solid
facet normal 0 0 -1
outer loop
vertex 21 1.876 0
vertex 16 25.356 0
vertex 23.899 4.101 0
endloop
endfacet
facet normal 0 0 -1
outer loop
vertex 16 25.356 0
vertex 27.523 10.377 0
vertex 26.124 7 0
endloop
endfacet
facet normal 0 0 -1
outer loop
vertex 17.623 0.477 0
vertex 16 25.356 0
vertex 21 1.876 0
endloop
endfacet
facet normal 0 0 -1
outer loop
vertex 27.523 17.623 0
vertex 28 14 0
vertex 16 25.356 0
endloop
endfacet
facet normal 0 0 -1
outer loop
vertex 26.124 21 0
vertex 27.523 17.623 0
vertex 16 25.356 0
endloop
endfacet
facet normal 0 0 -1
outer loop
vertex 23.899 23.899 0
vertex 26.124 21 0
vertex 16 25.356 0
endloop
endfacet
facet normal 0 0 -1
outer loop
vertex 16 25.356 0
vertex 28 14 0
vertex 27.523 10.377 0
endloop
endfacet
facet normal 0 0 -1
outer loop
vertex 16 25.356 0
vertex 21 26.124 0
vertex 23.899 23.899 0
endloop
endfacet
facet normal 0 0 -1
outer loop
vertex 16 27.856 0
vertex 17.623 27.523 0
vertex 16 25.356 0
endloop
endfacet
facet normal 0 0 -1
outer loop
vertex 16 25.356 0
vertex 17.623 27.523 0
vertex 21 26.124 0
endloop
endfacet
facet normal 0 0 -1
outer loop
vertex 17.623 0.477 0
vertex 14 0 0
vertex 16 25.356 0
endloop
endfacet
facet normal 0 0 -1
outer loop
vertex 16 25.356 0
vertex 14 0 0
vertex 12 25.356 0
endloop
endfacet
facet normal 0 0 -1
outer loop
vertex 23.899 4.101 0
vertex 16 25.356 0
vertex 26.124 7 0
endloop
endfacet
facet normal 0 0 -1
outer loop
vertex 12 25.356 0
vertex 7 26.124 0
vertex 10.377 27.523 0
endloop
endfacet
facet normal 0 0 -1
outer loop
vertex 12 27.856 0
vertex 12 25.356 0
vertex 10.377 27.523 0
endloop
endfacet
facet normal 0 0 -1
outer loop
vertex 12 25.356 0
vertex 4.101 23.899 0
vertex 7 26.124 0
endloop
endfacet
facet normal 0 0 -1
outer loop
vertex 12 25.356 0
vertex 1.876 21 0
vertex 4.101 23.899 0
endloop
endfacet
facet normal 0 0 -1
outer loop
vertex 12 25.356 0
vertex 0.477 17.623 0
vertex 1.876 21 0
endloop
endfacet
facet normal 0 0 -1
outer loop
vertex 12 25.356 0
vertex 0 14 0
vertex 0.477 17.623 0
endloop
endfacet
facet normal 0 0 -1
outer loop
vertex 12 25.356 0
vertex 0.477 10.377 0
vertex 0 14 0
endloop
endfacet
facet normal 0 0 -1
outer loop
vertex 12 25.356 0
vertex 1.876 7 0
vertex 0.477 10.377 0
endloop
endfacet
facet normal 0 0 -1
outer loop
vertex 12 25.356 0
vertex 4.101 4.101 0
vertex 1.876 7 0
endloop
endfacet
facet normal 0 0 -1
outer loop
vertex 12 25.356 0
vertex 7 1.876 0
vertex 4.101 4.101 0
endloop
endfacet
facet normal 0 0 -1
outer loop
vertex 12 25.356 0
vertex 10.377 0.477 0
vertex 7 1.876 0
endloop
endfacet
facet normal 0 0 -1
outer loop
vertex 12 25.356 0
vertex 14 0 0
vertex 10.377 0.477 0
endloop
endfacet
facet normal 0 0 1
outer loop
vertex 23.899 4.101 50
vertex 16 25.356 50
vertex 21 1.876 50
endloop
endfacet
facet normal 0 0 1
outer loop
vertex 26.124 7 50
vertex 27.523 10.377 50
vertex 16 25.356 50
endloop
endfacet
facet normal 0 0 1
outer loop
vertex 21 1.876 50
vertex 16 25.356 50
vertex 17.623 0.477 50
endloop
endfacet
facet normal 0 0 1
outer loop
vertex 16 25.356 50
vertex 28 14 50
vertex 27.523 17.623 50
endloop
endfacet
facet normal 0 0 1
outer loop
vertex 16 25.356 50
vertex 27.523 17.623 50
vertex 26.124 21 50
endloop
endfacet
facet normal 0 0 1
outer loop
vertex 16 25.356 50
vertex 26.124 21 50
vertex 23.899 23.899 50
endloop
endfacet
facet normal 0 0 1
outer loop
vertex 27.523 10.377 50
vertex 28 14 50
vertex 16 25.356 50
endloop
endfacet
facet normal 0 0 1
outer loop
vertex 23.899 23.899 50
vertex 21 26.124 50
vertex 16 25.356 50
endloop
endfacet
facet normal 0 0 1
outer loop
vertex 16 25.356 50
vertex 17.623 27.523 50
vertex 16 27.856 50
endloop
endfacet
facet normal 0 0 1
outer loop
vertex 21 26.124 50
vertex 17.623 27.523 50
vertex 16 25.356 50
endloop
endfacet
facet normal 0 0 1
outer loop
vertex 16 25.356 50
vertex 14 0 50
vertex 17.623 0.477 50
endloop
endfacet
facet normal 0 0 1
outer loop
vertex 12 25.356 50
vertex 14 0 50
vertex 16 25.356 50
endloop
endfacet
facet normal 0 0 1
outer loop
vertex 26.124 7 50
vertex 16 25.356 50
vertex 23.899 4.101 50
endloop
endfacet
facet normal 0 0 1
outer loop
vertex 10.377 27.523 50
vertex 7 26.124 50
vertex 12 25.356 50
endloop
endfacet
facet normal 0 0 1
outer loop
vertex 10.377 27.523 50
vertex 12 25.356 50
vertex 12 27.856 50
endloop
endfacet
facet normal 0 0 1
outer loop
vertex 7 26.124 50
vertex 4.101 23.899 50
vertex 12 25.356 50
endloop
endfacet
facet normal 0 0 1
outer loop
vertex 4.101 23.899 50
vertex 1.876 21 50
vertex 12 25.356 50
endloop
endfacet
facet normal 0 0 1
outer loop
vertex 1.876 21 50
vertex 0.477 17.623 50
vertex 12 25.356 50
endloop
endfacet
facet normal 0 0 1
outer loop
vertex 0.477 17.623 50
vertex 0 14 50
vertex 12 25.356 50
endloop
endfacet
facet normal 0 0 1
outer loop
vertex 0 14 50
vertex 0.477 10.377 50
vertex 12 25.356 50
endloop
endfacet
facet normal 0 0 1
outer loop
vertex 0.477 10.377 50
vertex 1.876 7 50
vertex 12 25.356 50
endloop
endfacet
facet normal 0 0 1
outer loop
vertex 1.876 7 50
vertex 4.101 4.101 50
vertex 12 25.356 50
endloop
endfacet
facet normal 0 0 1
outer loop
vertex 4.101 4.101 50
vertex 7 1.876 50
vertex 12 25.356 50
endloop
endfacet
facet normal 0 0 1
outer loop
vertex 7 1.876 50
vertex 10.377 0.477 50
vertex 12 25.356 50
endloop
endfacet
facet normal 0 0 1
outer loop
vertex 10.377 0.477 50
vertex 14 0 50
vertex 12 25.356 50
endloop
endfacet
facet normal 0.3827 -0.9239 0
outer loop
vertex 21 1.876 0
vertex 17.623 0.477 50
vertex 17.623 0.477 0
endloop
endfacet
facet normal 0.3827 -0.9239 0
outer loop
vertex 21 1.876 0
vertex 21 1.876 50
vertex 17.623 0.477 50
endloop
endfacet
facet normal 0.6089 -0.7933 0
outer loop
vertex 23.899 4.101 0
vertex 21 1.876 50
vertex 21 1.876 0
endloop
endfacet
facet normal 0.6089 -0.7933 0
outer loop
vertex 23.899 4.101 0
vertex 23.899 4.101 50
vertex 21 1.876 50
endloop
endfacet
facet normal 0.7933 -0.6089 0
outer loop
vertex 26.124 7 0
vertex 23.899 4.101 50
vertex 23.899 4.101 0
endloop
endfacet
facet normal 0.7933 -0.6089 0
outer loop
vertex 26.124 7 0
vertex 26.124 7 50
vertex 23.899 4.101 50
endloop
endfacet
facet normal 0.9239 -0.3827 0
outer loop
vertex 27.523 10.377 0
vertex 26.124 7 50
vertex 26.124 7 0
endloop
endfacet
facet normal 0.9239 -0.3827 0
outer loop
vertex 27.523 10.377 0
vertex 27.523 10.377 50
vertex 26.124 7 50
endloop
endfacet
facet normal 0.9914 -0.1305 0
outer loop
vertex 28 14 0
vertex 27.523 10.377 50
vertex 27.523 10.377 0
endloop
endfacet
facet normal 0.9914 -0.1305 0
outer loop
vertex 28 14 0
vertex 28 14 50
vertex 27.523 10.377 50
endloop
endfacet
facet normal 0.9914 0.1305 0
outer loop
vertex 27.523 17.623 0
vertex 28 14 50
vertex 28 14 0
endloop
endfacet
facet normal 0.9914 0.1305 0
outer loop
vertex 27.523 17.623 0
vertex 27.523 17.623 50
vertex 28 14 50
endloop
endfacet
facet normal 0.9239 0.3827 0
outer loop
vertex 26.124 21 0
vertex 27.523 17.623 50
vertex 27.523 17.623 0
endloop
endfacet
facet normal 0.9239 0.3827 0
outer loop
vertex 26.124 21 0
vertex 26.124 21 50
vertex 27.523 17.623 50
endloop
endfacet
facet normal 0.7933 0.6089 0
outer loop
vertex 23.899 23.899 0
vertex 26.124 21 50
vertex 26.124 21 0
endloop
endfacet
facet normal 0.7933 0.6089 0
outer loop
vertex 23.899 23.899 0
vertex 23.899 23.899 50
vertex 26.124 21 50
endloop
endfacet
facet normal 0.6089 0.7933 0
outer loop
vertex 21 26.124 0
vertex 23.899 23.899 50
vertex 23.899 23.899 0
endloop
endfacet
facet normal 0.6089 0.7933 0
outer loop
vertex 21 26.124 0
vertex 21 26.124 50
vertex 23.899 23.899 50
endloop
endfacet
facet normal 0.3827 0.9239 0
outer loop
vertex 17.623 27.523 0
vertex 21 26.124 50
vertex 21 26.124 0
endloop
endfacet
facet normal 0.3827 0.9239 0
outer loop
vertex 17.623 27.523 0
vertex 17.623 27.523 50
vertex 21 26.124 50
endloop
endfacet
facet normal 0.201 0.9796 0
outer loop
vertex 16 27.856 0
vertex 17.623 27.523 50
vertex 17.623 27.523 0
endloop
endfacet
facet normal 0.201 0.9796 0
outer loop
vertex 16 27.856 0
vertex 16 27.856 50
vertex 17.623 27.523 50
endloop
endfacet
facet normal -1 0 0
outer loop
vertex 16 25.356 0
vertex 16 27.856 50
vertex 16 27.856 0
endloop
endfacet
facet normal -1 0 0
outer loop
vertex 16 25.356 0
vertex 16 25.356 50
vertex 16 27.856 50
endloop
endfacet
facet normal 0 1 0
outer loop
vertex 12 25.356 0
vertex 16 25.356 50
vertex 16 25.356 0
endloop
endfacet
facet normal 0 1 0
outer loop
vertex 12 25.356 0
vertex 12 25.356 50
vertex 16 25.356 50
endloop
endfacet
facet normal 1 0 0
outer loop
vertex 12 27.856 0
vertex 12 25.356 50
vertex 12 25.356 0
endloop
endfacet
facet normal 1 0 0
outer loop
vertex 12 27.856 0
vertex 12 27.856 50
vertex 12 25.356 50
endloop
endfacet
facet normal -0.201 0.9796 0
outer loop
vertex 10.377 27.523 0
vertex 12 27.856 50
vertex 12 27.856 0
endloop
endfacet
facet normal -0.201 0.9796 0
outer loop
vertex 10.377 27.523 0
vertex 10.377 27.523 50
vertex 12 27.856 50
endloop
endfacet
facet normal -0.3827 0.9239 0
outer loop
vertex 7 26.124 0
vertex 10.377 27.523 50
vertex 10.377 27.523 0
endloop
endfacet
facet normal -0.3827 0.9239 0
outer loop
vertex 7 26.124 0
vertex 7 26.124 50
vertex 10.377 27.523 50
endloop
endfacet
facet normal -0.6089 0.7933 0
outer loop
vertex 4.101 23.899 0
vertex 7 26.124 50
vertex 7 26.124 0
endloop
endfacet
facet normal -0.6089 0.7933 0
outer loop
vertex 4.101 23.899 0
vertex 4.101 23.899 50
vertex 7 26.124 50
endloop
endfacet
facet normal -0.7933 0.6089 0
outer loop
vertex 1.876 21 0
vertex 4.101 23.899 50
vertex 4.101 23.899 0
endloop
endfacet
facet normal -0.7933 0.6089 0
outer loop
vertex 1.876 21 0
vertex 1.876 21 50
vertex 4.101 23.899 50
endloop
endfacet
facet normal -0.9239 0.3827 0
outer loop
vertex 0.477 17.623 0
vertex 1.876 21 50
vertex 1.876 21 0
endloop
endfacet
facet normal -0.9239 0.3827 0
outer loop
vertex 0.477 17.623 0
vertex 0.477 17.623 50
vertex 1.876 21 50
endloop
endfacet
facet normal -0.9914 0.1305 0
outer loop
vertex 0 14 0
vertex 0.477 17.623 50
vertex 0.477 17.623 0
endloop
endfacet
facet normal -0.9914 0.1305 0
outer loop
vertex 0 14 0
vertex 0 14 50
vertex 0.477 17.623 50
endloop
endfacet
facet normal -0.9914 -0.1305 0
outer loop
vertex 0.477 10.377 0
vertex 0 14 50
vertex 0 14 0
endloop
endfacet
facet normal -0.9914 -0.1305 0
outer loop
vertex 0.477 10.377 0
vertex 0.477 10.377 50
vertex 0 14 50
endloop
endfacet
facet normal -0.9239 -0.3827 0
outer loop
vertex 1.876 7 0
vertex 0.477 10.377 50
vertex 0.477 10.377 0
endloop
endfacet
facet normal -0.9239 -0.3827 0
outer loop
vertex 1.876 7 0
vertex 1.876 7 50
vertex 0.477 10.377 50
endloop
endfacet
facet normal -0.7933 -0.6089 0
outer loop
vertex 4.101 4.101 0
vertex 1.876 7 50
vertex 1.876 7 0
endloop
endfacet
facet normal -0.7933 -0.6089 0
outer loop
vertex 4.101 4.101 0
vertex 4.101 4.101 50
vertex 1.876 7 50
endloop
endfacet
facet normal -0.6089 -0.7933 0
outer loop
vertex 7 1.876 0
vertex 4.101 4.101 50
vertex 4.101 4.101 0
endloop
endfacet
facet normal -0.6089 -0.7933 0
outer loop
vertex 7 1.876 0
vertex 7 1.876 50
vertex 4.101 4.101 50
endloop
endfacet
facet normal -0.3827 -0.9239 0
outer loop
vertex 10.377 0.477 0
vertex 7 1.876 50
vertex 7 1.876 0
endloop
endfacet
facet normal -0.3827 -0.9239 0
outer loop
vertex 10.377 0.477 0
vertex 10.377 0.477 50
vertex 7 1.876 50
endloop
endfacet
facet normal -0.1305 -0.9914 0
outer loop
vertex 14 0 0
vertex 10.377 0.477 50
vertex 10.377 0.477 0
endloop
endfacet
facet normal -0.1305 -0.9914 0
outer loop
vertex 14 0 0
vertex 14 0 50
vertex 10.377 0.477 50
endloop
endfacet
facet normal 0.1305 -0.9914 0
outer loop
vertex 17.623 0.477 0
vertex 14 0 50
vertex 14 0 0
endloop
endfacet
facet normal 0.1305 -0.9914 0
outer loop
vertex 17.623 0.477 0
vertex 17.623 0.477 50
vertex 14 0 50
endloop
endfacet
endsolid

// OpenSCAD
$fn = 32;

// ----------------------------------------------------------------------
// Keyway shaft: d28 shaft, key 4 x 2.5 mm
// ----------------------------------------------------------------------

// --- parameters (mm) ---
shaft_r = 14;             // shaft radius
key_w = 4;                // keyway width
key_d = 2.5;              // keyway depth below the surface line
plate_t = 50;             // shaft length, Z (extrusion height)
fit_tol = 0.1;            // declared fit tolerance (prompt contract)
free_tol = 0.5;           // declared free tolerance (prompt contract)

shaft_d = 2 * shaft_r;  // shaft diameter
circle_step = 15;  // polygon sampling step, degrees

profile = [[10.377, 27.523], [7, 26.124], [4.101, 23.899], [1.876, 21], [0.477, 17.623], [0, 14], [0.477, 10.377], [1.876, 7], [4.101, 4.101], [7, 1.876], [10.377, 0.477], [14, 0], [17.623, 0.477], [21, 1.876], [23.899, 4.101], [26.124, 7], [27.523, 10.377], [28, 14], [27.523, 17.623], [26.124, 21], [23.899, 23.899], [21, 26.124], [17.623, 27.523], [16, 27.856], [16, 25.356], [12, 25.356], [12, 27.856]];  // primary outline, 27 points, counter clockwise

// --- the one profile operation ---
linear_extrude(height = plate_t) polygon(points = profile);
